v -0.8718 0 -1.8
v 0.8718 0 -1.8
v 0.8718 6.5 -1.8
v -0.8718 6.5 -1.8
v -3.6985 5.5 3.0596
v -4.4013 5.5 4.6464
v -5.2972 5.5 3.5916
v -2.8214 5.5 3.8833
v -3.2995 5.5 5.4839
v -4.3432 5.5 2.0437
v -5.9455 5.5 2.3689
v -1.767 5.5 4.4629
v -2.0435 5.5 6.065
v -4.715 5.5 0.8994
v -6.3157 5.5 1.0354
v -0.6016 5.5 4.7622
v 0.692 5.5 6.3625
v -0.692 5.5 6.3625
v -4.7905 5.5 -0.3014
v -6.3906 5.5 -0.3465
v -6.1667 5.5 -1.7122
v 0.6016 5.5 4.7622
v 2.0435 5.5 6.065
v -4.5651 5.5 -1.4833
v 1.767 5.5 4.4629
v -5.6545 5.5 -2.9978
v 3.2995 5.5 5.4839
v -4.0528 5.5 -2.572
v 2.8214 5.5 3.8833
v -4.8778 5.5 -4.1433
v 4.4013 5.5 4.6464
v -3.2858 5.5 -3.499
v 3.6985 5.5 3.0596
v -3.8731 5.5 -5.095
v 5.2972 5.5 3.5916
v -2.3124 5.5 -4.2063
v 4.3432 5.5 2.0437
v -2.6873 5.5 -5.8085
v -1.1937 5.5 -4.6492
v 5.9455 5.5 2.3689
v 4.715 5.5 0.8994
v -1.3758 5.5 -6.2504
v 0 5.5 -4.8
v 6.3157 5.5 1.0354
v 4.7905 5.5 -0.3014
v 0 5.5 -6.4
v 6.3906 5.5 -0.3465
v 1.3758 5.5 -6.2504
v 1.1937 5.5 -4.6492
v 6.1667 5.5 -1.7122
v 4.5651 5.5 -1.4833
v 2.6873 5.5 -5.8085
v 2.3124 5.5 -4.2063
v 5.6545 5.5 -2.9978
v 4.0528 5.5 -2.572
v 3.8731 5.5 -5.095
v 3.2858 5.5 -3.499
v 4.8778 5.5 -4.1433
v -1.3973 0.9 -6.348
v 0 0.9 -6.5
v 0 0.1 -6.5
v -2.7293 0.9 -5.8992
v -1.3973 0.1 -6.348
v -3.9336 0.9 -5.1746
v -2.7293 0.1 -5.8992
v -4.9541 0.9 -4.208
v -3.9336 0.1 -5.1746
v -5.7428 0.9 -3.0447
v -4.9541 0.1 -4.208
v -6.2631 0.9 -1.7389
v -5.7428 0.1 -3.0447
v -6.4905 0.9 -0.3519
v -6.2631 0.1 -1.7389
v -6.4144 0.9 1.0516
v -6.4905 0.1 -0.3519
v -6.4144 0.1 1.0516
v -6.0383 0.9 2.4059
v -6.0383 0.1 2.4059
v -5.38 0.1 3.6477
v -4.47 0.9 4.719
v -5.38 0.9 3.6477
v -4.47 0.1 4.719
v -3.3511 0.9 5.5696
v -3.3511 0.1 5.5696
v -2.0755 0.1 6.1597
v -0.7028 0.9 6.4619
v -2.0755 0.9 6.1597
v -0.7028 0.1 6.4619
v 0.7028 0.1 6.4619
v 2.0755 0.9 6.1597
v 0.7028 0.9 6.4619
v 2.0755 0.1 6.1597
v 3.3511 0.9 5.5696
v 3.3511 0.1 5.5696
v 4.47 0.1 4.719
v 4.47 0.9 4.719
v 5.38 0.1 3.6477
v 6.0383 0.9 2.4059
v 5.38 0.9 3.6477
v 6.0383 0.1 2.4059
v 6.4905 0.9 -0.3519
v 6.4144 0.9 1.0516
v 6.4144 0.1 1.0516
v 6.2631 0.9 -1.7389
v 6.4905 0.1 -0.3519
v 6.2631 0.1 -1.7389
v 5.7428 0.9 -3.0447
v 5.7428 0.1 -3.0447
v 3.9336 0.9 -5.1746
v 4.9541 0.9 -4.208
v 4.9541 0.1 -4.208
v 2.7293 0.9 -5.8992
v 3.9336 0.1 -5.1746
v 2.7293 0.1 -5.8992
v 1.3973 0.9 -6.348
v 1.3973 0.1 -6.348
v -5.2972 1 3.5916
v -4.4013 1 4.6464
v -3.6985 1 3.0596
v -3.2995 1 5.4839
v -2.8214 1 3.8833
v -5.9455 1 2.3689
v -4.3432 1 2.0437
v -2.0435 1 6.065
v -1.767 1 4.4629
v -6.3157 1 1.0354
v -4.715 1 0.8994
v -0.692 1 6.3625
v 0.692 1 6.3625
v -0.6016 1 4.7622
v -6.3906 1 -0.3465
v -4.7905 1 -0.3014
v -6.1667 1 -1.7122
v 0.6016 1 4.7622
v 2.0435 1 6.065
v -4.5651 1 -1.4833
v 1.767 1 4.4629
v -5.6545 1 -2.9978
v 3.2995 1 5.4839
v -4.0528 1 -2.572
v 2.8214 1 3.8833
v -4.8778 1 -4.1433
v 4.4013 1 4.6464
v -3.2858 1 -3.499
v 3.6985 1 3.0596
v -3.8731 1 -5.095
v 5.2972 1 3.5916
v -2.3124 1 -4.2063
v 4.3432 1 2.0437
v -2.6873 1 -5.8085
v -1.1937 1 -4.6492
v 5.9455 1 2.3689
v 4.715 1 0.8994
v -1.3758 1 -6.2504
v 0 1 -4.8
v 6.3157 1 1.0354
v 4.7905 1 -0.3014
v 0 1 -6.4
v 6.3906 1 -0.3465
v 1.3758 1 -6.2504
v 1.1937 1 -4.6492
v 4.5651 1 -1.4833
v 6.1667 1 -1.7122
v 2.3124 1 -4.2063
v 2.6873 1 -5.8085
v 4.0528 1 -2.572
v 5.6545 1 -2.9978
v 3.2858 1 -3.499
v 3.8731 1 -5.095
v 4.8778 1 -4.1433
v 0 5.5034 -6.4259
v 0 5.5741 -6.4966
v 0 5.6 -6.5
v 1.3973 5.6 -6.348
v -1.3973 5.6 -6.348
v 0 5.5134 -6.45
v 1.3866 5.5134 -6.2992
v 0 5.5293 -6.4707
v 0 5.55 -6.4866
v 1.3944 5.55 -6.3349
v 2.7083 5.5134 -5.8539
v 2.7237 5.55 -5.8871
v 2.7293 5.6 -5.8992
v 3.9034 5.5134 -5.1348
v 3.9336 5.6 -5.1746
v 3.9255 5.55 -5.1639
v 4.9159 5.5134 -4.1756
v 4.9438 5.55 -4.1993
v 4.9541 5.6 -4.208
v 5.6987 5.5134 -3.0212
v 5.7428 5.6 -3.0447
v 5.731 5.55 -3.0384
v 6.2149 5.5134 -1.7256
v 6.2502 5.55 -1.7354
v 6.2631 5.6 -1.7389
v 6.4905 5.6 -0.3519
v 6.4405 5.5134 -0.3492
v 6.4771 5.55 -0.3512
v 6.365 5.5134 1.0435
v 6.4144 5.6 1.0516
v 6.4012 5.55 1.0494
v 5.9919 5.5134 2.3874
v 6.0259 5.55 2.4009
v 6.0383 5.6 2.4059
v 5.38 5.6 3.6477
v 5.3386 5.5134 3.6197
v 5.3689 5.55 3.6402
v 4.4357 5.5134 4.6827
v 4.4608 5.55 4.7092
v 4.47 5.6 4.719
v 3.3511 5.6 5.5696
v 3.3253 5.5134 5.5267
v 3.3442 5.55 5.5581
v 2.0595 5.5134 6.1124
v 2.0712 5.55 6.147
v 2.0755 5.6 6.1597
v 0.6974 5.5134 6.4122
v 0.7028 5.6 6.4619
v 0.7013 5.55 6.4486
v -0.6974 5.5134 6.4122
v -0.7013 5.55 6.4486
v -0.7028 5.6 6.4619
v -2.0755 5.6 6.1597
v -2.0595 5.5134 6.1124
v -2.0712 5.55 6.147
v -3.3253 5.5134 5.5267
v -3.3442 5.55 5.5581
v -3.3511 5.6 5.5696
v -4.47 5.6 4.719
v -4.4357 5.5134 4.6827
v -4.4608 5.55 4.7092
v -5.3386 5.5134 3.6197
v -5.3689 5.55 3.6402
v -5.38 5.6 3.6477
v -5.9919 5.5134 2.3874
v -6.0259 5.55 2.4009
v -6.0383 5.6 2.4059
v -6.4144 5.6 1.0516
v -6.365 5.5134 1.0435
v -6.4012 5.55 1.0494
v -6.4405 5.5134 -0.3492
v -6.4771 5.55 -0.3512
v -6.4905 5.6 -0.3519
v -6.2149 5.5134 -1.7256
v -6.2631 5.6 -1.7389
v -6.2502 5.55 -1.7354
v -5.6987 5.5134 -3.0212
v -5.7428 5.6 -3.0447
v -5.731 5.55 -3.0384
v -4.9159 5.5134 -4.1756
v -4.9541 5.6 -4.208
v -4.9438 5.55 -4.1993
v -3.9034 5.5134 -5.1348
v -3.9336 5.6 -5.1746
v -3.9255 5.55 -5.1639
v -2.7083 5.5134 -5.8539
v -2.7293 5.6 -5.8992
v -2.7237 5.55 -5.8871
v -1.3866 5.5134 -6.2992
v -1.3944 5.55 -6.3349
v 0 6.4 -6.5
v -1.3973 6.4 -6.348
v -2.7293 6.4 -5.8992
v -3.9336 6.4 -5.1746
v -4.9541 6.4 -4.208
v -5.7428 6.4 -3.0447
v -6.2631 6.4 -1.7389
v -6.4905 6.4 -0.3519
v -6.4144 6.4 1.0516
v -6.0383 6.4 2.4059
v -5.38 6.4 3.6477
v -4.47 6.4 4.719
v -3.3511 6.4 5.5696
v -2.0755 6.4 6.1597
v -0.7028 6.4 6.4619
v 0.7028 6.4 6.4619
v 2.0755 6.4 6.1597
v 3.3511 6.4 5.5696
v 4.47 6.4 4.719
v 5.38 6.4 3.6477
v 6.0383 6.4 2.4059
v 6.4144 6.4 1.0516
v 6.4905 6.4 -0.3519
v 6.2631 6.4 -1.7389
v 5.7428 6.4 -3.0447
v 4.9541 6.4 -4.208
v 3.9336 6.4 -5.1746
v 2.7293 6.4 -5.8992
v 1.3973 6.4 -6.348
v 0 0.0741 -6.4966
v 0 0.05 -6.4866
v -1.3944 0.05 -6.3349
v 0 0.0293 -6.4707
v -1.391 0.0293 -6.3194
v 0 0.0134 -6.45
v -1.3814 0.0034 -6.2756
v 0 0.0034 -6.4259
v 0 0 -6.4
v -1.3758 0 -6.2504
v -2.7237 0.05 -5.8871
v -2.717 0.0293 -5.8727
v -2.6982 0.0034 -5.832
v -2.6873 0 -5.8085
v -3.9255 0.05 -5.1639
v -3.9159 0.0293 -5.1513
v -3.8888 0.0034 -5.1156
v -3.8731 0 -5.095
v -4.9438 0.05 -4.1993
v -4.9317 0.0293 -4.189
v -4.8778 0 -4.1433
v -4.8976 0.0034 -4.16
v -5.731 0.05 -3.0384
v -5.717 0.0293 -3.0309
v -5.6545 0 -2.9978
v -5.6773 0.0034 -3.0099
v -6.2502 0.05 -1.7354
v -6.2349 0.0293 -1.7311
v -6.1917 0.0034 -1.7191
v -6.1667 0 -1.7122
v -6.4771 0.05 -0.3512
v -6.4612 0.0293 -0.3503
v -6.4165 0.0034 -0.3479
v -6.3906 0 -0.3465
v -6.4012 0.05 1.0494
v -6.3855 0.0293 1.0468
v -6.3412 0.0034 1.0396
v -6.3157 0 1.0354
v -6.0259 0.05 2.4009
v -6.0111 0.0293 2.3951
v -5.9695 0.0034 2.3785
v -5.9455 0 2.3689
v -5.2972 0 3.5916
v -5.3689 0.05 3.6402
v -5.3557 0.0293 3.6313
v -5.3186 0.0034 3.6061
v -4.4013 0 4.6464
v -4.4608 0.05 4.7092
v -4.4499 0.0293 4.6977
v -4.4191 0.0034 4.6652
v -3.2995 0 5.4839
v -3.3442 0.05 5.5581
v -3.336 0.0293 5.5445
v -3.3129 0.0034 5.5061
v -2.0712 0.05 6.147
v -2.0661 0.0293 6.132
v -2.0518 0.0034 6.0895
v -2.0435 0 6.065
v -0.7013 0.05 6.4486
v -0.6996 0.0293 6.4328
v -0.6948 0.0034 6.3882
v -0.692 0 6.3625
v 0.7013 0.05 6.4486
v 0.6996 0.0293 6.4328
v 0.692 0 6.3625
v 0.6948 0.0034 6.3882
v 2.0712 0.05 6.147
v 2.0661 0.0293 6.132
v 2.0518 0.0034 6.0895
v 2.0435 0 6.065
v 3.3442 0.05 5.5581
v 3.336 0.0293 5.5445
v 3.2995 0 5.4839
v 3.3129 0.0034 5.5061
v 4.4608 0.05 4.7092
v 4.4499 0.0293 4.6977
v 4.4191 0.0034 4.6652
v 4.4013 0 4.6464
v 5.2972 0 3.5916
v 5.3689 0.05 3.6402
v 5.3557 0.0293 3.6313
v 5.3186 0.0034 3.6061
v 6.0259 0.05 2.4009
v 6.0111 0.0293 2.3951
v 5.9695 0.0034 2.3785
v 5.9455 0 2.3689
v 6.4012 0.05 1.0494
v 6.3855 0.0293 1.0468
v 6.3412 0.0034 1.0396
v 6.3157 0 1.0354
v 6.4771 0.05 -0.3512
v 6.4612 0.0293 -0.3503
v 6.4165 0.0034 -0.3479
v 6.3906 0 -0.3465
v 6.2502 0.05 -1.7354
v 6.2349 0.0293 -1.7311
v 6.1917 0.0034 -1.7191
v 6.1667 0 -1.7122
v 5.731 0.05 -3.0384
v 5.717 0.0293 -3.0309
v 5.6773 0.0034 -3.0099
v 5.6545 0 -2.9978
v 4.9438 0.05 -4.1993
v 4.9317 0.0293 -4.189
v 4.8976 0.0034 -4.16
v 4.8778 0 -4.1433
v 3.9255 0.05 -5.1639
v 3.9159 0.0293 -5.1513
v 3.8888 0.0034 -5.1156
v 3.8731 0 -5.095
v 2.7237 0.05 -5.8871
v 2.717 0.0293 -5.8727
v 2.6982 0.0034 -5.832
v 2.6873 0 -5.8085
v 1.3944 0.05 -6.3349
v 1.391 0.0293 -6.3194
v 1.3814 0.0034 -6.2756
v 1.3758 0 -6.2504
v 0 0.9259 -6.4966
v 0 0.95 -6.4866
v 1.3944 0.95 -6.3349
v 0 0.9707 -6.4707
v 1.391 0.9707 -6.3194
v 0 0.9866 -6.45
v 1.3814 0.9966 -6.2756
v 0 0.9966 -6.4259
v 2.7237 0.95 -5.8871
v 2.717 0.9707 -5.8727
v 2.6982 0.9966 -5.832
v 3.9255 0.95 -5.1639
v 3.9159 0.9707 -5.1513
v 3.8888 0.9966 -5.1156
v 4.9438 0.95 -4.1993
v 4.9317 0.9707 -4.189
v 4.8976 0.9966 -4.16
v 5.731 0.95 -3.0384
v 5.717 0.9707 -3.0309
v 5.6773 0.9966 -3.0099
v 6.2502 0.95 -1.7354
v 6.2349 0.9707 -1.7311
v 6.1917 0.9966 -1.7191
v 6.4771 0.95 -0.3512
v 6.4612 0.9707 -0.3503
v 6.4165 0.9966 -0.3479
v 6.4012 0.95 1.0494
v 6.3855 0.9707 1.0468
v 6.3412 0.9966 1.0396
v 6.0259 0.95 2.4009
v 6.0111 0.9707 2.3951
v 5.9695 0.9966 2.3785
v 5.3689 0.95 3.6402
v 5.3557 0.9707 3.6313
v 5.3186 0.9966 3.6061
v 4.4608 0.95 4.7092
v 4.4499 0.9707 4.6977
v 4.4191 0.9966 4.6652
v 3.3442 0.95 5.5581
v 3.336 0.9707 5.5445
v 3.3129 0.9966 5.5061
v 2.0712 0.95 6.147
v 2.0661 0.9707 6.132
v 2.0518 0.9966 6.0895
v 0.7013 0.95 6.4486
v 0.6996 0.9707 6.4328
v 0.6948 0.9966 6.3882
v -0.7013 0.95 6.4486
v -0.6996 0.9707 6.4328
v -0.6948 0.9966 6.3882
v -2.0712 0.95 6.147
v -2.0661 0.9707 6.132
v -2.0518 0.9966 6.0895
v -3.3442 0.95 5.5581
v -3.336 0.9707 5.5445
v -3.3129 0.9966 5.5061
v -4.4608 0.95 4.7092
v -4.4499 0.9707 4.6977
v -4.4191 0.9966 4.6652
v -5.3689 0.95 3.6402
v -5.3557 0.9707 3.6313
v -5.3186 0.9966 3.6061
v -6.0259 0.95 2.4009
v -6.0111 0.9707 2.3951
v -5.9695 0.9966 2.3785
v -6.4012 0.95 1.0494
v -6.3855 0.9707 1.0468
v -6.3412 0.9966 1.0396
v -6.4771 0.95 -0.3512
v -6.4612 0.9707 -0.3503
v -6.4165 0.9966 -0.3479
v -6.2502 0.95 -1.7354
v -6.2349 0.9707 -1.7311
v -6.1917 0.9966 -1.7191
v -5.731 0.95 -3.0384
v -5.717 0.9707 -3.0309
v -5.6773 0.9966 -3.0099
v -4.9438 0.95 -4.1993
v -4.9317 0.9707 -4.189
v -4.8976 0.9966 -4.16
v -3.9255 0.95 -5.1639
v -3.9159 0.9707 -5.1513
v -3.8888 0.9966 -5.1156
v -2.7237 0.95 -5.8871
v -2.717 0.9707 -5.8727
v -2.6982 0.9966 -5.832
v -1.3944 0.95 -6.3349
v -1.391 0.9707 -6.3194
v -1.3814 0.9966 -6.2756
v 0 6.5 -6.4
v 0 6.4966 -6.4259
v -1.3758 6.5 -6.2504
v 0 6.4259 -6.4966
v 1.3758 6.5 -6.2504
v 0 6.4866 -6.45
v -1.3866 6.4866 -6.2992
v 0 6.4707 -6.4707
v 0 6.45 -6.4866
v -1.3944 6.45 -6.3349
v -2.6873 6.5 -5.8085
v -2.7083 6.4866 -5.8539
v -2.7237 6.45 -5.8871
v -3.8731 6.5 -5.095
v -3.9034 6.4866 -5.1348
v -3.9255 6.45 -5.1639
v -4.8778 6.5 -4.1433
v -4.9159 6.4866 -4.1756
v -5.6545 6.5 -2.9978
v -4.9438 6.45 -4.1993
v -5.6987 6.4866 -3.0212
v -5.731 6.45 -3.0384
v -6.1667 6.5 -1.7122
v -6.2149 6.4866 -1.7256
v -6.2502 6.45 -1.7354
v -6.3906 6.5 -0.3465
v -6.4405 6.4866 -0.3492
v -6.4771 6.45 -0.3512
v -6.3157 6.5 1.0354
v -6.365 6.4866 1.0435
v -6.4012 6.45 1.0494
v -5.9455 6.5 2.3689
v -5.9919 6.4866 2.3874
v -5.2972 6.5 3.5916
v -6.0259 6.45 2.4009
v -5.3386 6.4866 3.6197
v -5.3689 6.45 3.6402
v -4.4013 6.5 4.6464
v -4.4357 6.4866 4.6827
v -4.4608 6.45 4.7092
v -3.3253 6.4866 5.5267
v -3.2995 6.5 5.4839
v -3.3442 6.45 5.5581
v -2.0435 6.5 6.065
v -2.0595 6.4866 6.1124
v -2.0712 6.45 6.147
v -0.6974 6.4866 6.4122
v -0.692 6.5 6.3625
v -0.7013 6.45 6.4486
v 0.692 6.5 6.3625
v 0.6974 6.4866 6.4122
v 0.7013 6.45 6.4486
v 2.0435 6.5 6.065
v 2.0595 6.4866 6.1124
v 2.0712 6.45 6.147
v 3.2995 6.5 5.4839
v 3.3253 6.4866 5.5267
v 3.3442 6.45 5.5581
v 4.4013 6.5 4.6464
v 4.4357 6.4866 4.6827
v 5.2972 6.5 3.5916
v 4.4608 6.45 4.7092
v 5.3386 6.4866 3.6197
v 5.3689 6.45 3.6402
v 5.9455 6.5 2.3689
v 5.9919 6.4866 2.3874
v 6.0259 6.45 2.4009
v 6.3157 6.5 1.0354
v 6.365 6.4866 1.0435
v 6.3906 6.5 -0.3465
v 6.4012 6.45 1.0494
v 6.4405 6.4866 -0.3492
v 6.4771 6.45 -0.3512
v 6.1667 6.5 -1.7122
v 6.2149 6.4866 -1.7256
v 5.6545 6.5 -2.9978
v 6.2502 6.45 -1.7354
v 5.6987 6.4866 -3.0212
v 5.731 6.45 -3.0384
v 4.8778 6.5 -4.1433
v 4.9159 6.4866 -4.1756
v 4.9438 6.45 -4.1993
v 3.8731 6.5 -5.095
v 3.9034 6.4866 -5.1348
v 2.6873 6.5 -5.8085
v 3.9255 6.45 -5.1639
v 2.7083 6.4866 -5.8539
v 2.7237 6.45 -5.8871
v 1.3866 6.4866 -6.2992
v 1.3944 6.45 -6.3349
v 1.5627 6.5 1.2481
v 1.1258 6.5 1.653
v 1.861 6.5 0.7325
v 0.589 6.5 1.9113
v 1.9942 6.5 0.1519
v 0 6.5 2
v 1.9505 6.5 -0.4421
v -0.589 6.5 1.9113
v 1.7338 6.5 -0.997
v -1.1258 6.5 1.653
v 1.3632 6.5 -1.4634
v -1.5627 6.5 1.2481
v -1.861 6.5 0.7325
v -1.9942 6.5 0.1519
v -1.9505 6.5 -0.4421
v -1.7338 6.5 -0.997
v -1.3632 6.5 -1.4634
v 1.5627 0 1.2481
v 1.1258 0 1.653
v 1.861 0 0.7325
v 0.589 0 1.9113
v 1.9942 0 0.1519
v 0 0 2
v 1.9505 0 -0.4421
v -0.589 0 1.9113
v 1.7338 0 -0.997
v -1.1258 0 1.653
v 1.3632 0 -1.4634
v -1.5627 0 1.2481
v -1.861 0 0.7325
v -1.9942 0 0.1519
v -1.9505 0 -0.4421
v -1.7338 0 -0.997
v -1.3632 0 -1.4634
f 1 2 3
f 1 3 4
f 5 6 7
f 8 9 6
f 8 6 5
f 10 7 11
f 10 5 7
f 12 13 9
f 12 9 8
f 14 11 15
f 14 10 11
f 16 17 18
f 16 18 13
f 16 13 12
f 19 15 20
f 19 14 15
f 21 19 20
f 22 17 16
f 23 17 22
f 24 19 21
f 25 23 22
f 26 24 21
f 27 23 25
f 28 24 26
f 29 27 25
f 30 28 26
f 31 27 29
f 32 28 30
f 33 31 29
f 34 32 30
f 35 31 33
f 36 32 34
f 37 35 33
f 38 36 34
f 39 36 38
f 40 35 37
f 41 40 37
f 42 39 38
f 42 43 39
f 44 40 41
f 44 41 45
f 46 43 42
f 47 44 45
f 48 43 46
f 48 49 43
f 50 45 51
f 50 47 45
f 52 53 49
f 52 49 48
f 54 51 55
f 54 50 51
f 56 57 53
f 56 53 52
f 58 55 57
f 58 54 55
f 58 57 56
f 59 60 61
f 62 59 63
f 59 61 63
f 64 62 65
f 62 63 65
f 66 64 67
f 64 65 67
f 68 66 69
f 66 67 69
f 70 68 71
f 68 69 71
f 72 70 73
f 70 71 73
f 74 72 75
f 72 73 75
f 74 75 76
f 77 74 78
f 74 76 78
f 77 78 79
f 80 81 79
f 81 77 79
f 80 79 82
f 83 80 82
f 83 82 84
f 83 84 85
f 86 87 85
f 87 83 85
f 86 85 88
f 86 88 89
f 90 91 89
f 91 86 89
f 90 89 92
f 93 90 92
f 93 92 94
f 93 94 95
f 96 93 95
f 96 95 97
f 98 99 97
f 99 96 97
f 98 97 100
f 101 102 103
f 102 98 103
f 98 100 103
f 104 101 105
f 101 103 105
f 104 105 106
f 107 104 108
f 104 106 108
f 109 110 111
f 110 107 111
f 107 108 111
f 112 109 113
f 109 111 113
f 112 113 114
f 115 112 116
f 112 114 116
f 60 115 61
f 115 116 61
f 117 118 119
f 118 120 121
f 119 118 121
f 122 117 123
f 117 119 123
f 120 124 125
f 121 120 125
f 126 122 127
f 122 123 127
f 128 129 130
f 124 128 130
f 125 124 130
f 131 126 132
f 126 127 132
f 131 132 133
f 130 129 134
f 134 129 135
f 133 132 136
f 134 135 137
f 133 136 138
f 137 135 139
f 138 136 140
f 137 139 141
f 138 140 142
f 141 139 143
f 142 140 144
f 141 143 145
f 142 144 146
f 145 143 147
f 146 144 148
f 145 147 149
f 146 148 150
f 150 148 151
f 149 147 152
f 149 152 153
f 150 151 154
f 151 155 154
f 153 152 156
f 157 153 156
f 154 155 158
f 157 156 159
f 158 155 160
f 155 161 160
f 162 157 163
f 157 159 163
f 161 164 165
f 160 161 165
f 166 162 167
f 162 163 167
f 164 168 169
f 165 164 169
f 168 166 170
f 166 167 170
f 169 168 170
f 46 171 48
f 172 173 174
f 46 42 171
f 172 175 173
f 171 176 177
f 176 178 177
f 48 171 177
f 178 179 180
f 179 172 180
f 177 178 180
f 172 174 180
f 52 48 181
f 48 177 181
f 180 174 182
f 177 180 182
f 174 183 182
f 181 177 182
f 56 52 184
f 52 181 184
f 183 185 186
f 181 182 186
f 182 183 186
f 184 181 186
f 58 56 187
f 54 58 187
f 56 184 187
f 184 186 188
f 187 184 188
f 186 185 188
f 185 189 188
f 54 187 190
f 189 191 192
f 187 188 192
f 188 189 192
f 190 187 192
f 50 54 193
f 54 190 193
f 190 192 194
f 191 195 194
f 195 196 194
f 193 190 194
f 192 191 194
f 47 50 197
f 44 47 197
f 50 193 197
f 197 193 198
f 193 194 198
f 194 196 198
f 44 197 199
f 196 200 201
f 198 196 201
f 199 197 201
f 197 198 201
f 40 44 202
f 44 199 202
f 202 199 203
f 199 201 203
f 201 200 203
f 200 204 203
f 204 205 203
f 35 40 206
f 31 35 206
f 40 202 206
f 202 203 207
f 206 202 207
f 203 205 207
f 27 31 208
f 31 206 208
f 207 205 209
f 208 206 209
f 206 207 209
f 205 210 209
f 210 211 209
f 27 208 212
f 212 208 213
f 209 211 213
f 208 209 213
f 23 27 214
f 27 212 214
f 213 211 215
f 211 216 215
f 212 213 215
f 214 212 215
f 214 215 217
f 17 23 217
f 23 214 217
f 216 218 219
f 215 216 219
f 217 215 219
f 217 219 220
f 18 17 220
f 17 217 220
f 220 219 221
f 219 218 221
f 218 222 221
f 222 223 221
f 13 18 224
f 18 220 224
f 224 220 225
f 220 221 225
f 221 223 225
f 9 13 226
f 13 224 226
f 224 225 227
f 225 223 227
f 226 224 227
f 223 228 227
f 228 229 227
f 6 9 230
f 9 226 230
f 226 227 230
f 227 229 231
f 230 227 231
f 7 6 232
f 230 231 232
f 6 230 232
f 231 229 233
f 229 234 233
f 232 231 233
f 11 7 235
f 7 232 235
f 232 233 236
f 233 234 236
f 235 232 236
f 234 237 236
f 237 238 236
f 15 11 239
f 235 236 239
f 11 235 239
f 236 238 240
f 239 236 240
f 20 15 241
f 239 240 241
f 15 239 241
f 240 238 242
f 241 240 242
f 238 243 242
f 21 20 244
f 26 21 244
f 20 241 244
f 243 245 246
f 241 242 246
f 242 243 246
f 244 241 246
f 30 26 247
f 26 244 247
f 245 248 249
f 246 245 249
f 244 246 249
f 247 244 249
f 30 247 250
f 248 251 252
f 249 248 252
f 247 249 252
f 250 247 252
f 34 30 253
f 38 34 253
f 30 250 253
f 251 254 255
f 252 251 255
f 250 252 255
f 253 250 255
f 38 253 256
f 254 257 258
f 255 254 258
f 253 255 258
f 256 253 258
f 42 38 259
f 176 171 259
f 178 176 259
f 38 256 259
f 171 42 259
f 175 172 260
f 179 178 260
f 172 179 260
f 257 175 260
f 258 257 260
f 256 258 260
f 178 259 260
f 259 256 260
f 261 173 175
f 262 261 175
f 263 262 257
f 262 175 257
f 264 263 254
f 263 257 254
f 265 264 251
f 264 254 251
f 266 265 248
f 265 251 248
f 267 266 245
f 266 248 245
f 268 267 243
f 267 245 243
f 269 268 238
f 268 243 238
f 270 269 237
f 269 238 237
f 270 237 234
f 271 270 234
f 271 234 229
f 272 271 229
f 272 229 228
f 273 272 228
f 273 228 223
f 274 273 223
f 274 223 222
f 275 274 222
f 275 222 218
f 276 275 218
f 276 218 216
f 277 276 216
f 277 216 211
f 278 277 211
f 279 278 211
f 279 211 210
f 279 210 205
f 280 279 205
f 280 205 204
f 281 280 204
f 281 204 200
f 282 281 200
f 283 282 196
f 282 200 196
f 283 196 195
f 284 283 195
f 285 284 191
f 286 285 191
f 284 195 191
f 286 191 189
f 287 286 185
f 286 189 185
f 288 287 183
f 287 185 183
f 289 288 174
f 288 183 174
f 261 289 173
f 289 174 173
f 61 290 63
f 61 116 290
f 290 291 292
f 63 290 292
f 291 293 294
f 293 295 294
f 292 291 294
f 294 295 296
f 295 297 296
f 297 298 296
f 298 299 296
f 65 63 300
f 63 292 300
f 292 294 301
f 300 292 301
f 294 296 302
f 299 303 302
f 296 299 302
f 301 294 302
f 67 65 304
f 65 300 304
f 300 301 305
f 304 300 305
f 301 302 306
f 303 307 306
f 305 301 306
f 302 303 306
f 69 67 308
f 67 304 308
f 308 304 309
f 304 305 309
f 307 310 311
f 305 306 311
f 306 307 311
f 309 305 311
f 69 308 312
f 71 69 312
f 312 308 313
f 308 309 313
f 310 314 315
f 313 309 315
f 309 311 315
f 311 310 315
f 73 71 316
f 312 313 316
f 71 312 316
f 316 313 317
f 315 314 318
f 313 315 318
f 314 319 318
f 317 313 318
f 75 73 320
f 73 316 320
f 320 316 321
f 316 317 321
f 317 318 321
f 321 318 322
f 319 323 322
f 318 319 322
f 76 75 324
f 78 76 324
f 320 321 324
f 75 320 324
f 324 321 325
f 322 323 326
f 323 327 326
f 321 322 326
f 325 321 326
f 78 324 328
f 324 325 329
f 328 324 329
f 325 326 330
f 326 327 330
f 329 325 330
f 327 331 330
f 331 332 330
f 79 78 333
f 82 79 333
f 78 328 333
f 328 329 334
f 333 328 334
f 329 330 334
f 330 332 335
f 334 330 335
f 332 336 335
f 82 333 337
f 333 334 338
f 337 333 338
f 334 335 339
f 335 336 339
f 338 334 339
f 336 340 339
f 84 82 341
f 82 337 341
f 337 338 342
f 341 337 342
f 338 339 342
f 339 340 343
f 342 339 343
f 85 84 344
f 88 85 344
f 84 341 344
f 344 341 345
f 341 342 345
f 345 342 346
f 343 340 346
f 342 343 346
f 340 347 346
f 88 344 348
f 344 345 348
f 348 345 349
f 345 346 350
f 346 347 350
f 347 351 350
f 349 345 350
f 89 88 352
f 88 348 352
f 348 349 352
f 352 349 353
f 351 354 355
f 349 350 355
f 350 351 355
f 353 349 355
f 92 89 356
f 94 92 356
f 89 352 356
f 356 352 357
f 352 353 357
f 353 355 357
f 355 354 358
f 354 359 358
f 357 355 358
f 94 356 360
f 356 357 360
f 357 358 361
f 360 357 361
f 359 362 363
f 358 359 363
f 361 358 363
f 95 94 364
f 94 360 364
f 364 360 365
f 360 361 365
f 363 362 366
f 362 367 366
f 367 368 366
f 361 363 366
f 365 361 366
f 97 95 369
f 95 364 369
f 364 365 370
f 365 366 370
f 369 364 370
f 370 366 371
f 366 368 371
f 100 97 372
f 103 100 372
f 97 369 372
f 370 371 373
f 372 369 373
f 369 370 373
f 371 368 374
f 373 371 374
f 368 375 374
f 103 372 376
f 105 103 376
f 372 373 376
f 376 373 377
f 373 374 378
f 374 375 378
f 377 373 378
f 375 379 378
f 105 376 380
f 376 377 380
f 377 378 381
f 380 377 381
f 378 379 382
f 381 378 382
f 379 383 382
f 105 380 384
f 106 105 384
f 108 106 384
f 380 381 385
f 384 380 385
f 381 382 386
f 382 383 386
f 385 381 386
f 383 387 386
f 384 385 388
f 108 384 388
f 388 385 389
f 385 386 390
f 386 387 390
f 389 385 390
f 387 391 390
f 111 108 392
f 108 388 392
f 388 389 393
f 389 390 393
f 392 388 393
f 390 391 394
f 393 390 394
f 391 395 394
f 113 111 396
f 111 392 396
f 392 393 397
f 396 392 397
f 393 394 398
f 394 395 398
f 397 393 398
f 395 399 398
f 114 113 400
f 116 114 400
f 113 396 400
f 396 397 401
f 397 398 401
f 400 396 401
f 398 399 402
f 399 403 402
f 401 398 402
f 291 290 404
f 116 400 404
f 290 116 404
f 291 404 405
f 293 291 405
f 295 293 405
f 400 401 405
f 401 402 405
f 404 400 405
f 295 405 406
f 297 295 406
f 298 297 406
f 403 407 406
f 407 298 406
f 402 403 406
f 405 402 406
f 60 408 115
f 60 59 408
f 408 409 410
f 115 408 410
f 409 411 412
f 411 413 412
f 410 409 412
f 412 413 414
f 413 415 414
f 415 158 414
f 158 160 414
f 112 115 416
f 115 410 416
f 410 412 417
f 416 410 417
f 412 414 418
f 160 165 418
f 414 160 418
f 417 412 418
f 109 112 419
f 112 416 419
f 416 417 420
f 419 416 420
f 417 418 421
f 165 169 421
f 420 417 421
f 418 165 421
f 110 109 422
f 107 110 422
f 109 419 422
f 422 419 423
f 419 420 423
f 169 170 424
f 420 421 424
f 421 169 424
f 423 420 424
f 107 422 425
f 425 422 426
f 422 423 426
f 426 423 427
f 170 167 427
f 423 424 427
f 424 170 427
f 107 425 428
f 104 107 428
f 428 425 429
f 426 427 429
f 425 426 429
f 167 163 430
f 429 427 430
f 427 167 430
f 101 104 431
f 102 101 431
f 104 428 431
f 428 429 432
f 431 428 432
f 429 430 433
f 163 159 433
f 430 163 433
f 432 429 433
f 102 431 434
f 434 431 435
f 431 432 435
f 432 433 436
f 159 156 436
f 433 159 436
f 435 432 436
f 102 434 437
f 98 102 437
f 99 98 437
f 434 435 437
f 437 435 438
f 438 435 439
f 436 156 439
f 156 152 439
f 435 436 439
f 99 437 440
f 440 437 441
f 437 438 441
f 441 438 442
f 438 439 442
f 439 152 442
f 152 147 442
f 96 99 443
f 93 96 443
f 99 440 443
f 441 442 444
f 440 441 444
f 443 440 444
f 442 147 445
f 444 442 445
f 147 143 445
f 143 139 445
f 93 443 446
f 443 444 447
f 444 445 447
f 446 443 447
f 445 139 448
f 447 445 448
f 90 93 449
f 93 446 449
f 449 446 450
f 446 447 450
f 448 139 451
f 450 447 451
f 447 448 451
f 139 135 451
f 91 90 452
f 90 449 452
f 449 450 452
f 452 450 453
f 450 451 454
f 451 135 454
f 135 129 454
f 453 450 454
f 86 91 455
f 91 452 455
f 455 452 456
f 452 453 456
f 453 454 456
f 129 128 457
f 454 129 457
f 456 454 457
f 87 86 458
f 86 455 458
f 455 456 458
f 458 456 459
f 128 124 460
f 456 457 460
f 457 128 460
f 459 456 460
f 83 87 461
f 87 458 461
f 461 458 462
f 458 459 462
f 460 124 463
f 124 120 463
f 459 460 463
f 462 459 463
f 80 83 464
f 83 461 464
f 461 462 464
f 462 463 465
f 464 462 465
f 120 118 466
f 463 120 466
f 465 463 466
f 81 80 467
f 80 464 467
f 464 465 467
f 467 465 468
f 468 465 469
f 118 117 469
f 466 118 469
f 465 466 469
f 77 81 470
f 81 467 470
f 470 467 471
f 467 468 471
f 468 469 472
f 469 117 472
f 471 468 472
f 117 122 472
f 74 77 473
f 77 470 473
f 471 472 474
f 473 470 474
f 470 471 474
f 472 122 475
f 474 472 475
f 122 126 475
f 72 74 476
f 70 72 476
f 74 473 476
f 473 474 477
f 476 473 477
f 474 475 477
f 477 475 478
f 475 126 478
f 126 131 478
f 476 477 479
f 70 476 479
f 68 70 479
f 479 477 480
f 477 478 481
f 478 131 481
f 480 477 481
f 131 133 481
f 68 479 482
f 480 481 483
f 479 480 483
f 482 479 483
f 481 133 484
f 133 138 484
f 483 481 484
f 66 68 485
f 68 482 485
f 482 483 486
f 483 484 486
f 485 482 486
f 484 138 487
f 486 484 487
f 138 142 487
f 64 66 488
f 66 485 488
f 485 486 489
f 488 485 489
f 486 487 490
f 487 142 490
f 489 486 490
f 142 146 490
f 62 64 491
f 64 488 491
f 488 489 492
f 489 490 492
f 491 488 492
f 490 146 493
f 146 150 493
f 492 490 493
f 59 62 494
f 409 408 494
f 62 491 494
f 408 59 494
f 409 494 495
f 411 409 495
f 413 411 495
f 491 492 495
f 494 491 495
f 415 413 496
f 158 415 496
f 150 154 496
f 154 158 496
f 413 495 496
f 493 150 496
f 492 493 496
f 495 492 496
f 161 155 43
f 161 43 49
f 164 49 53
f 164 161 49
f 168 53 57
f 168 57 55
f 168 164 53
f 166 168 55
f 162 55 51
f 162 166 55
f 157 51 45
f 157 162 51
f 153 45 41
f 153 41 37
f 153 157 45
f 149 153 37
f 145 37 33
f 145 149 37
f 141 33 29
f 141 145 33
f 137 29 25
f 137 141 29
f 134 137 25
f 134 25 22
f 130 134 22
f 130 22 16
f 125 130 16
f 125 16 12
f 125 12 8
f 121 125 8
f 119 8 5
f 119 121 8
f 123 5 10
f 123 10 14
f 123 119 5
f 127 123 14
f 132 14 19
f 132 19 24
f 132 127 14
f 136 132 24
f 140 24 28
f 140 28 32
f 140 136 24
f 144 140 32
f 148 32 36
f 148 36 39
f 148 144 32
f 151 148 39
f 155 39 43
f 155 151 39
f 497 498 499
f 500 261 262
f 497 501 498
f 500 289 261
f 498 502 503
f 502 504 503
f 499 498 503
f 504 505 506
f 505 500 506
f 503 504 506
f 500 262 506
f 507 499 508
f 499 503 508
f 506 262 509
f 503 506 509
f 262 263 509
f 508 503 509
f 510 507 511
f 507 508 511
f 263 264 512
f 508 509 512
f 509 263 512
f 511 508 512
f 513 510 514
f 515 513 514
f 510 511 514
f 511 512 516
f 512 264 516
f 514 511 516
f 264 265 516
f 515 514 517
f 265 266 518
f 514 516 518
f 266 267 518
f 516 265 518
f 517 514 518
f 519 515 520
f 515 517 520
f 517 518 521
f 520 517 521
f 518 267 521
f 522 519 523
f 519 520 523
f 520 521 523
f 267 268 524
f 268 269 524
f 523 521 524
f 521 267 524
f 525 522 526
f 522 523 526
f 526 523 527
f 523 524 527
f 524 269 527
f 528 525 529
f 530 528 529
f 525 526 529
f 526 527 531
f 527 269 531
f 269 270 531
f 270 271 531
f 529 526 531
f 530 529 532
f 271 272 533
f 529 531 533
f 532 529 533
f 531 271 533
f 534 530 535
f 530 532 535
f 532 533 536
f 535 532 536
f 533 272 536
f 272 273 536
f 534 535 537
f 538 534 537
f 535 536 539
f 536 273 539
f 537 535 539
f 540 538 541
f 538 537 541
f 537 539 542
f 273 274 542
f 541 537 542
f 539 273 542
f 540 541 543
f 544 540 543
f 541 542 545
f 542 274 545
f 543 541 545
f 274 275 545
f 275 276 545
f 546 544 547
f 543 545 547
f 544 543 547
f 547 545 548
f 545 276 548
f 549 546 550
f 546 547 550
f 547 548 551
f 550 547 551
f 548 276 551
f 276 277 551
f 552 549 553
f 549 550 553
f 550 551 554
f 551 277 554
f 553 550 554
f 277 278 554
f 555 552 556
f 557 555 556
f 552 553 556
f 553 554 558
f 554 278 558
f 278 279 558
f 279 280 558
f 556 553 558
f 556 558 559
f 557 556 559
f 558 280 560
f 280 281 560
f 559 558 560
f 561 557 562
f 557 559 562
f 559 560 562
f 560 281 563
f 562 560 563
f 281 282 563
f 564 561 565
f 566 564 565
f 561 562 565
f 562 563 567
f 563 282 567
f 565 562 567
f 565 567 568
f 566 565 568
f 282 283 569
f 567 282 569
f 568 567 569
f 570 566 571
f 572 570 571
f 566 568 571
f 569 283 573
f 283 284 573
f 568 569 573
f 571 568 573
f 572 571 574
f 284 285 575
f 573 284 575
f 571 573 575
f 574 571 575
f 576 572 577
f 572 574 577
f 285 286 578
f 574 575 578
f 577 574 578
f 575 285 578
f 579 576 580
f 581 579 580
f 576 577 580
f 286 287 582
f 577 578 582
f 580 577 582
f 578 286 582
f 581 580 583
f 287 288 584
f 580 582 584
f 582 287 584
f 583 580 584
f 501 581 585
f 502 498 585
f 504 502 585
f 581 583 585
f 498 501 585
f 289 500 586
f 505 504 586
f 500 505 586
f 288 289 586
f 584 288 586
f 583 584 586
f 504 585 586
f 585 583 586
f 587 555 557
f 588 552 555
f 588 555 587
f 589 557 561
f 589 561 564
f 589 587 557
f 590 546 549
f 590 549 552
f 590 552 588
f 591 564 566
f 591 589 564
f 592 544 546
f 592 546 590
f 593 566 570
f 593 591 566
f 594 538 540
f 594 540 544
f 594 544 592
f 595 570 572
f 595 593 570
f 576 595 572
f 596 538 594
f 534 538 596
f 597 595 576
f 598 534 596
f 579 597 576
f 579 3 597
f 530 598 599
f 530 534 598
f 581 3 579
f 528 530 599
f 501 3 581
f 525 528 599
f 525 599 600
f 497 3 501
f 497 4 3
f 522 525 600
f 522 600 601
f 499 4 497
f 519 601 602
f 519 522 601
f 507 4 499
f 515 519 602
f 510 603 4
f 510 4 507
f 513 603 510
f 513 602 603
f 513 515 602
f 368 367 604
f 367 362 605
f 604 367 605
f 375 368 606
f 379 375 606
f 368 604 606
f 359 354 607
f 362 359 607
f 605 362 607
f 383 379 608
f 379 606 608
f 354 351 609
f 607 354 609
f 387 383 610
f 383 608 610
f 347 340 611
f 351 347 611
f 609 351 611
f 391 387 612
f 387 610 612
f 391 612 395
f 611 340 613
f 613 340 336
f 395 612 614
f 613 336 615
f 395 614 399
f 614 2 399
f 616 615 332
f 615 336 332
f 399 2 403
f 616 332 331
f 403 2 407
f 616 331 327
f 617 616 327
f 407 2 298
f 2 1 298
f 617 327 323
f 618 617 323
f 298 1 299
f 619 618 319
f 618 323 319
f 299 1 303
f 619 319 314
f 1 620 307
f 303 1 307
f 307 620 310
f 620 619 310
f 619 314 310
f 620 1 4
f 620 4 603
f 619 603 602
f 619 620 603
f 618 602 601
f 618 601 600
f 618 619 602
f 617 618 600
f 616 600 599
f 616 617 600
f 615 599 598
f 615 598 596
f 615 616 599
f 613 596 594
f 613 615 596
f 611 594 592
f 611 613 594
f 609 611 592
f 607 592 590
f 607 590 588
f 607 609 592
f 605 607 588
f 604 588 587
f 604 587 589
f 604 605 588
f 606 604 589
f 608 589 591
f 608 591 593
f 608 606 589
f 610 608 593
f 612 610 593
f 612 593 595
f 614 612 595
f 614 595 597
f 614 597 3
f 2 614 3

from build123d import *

# Parameters (mm, degrees)
SKETCH_2_R          = 6.5
EXTRUDE_1_DEPTH     = 6.5
SKETCH_4_R          = 6.5
SKETCH_4_R_2        = 4.8
CUT_EXTRUDE_1_DEPTH = 4.5
FILLET_1_R          = 0.1


with BuildPart() as part:
    # 草图2 → 凸台-拉伸1 (new body)
    with BuildSketch(Plane(origin=(0, 0, 0), x_dir=(1, 0, 0), z_dir=(0, 1, 0))):
        with Locations(Location((0, 0, 0), (0, 0, 90))):
            Circle(SKETCH_2_R)
        with BuildLine():
            Line((0.871779789, 1.8), (-0.871779789, 1.8))
            ThreePointArc((-0.871779789, 1.8), (0, -2), (0.871779789, 1.8))
        make_face(mode=Mode.SUBTRACT)
    extrude(amount=EXTRUDE_1_DEPTH)

    # 草图4 → 切除-拉伸1 (cut)
    with BuildSketch(Plane(origin=(0, 1, 0), x_dir=(-1, 0, 0), z_dir=(0, -1, 0))):
        with Locations(Location((0, 0, 0), (0, 0, 90))):
            Circle(SKETCH_4_R)
        with Locations(Location((0, 0, 0), (0, 0, 90))):
            Circle(SKETCH_4_R_2, mode=Mode.SUBTRACT)
    extrude(amount=-CUT_EXTRUDE_1_DEPTH, mode=Mode.SUBTRACT)

    # 圆角1
    fillet_1_edges = [part.edges().sort_by_distance(p)[0] for p in [
        (0, 5.5, 6.5),
        (0, 1, 6.5),
        (0, 0, 6.5),
        (0, 6.5, 6.5),
    ]]
    fillet(fillet_1_edges, radius=FILLET_1_R)


solid = part.part
